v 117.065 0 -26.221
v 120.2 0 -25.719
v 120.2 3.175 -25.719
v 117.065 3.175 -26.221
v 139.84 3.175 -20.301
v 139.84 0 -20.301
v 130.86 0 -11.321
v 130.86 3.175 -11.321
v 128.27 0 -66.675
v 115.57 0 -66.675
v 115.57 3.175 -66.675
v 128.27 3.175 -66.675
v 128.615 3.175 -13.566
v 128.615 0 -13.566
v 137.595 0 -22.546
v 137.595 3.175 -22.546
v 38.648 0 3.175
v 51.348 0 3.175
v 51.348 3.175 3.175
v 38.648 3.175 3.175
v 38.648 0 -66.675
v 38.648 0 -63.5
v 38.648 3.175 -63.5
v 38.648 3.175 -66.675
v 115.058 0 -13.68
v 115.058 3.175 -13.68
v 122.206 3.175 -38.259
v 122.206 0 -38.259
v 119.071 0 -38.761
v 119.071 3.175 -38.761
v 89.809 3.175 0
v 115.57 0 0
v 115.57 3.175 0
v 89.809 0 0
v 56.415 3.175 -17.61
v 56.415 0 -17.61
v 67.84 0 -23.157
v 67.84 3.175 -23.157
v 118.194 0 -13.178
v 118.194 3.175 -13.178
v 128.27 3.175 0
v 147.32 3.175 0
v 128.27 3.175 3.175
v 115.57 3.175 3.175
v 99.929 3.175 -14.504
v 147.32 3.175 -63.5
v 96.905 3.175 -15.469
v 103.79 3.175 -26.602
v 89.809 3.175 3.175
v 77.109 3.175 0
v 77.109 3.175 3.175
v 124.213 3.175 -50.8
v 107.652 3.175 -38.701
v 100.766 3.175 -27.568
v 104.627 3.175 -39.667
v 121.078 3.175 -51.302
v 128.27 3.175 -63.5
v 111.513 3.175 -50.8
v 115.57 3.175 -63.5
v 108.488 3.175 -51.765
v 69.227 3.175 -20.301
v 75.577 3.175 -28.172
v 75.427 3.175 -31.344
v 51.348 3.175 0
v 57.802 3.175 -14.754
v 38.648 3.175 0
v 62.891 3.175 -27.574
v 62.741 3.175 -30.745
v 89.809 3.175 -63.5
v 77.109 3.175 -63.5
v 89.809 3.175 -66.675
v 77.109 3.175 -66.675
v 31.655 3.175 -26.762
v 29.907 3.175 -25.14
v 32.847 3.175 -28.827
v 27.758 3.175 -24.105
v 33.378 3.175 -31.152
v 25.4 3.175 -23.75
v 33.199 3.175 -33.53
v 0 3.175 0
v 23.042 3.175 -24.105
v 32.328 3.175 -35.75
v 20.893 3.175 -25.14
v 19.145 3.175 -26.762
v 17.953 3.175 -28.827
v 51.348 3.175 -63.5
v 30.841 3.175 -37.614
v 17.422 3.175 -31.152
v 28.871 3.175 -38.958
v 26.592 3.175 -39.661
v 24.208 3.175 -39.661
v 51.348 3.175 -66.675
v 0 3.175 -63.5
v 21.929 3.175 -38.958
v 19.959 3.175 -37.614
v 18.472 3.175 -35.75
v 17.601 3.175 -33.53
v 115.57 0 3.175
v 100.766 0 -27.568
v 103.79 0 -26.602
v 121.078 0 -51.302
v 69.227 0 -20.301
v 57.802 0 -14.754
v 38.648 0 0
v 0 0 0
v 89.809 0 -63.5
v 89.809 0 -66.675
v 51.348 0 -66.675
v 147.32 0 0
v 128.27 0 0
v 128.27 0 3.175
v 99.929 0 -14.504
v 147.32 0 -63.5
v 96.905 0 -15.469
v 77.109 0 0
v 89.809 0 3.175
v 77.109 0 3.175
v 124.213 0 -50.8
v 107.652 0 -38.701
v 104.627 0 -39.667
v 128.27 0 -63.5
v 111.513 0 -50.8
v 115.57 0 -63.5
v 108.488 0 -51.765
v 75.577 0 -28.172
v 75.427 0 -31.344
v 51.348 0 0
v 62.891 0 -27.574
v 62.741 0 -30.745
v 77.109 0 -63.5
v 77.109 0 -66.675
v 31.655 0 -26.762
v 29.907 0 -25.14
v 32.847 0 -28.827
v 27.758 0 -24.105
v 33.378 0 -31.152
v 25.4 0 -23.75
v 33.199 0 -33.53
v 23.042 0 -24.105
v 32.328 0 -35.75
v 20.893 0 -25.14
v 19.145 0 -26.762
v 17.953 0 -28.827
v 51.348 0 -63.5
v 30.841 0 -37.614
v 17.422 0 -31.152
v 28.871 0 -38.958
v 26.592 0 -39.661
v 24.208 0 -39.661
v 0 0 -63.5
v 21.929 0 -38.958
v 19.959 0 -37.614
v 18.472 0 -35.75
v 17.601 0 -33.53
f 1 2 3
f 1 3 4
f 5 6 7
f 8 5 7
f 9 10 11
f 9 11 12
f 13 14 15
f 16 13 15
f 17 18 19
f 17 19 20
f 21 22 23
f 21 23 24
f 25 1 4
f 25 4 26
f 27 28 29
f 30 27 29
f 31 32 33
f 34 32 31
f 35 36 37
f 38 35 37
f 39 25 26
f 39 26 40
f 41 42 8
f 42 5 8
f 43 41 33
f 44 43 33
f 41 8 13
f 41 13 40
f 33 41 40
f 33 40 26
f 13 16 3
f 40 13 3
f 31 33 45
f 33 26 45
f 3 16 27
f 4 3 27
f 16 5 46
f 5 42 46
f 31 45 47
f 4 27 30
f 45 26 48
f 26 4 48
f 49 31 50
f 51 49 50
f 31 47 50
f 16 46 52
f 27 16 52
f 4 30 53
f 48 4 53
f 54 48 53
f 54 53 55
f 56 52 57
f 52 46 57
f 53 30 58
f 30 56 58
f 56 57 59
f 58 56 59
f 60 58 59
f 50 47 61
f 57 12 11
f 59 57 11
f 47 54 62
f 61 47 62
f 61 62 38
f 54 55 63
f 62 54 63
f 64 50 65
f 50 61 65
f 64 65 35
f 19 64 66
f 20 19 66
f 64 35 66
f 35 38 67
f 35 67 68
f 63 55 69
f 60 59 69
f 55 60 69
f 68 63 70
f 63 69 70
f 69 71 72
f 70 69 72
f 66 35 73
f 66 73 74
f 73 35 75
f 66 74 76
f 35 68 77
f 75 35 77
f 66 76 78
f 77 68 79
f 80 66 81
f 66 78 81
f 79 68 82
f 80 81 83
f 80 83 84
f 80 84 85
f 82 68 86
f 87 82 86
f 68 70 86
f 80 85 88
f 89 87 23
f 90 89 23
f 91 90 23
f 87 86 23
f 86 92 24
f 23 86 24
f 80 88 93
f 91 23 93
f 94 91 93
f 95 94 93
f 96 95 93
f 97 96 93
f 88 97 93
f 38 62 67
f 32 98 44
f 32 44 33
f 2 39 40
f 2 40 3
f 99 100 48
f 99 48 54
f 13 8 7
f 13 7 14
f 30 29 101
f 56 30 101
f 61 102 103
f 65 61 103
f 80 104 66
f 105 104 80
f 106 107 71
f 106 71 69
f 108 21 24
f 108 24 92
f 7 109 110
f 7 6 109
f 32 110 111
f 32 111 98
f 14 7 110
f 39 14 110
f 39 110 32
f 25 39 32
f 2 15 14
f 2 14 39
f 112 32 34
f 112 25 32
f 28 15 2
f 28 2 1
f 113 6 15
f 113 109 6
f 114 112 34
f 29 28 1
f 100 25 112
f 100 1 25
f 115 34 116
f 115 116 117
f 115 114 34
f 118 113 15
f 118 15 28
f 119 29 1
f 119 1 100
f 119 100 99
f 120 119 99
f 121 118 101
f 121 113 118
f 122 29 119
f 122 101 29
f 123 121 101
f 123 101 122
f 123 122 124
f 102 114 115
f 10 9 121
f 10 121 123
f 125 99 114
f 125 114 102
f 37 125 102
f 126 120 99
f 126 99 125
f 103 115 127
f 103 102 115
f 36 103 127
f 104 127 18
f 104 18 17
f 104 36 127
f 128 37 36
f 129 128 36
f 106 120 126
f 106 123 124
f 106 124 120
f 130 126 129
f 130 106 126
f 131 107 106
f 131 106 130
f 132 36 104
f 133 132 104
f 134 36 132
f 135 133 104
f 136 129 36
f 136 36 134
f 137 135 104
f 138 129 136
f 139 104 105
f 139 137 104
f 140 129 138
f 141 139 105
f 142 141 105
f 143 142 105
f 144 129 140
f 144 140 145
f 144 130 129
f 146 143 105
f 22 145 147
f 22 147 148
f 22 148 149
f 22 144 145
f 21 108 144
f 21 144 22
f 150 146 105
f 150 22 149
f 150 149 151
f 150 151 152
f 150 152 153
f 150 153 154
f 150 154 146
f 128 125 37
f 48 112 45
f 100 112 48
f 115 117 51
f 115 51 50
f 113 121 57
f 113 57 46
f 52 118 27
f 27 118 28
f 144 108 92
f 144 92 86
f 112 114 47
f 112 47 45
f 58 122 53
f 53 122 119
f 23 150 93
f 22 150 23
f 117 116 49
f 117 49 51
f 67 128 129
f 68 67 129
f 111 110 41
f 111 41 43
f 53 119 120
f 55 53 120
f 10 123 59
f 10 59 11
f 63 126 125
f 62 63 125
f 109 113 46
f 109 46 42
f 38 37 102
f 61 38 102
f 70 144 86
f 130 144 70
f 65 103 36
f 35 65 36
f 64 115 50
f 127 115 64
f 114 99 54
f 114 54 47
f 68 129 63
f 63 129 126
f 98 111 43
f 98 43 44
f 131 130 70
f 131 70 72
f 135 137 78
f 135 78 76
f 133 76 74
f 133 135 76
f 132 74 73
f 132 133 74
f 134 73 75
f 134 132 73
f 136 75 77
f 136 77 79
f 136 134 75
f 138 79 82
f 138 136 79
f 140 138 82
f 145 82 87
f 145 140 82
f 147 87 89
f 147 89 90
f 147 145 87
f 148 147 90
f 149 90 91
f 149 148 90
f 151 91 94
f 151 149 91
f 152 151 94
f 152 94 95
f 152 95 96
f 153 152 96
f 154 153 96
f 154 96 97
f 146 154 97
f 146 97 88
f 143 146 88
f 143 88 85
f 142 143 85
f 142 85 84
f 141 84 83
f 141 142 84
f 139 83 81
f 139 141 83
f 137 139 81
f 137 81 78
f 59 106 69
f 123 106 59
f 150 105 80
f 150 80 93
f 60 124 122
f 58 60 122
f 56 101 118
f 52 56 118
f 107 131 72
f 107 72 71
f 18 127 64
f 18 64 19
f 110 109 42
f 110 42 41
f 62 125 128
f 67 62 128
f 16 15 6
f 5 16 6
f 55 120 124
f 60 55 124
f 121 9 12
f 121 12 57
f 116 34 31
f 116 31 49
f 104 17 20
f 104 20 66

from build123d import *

# Parameters (mm, degrees)
SKETCH1_R           = 8
BOSS_EXTRUDE1_DEPTH = 3.175


with BuildPart() as part:
    # Sketch1 → Boss-Extrude1 (new body)
    with BuildSketch(Plane(origin=(0, 0, 0), x_dir=(1, 0, 0), z_dir=(0, 1, 0))):
        Polygon((128.27, 0), (128.27, -3.175), (115.57, -3.175), (115.57, 0), (89.809134643, 0), (89.809134643, -3.175), (77.109134643, -3.175), (77.109134643, 0), (51.348269287, 0), (51.348269287, -3.175), (38.648269287, -3.175), (38.648269287, 0), (0, 0), (0, 63.5), (38.648269287, 63.5), (38.648269287, 66.675), (51.348269287, 66.675), (51.348269287, 63.5), (77.109134643, 63.5), (77.109134643, 66.675), (89.809134643, 66.675), (89.809134643, 63.5), (115.57, 63.5), (115.57, 66.675), (128.27, 66.675), (128.27, 63.5), (147.32, 63.5), (147.32, 0), align=None)
        with Locations(Location((25.4, 31.75, 0), (0, 0, 270))):
            Circle(SKETCH1_R, mode=Mode.SUBTRACT)
        Polygon((124.212866127, 50.8), (122.206447374, 38.259494277), (119.071320943, 38.761098966), (121.077739696, 51.301604688), align=None, mode=Mode.SUBTRACT)
        Polygon((117.064902189, 26.220593243), (115.058483436, 13.68008752), (118.193609867, 13.178482831), (120.20002862, 25.718988554), align=None, mode=Mode.SUBTRACT)
        Polygon((111.512866127, 50.8), (107.651646253, 38.701199188), (104.62694605, 39.666504157), (108.488165924, 51.765304968), align=None, mode=Mode.SUBTRACT)
        Polygon((100.765726177, 27.567703345), (96.904506303, 15.468902533), (99.929206506, 14.503597564), (103.79042638, 26.602398376), align=None, mode=Mode.SUBTRACT)
        Polygon((139.840468497, 20.301267714), (130.860212376, 11.321011593), (128.615148346, 13.566075623), (137.595404467, 22.546331745), align=None, mode=Mode.SUBTRACT)
        Polygon((69.226557851, 20.301267714), (57.802174059, 14.753885002), (56.415328381, 17.60998095), (67.839712173, 23.157363662), align=None, mode=Mode.SUBTRACT)
        Polygon((75.576557851, 28.17210754), (62.890656439, 27.573855616), (62.741093458, 30.745330969), (75.42699487, 31.343582893), align=None, mode=Mode.SUBTRACT)
    extrude(amount=BOSS_EXTRUDE1_DEPTH)


solid = part.part
